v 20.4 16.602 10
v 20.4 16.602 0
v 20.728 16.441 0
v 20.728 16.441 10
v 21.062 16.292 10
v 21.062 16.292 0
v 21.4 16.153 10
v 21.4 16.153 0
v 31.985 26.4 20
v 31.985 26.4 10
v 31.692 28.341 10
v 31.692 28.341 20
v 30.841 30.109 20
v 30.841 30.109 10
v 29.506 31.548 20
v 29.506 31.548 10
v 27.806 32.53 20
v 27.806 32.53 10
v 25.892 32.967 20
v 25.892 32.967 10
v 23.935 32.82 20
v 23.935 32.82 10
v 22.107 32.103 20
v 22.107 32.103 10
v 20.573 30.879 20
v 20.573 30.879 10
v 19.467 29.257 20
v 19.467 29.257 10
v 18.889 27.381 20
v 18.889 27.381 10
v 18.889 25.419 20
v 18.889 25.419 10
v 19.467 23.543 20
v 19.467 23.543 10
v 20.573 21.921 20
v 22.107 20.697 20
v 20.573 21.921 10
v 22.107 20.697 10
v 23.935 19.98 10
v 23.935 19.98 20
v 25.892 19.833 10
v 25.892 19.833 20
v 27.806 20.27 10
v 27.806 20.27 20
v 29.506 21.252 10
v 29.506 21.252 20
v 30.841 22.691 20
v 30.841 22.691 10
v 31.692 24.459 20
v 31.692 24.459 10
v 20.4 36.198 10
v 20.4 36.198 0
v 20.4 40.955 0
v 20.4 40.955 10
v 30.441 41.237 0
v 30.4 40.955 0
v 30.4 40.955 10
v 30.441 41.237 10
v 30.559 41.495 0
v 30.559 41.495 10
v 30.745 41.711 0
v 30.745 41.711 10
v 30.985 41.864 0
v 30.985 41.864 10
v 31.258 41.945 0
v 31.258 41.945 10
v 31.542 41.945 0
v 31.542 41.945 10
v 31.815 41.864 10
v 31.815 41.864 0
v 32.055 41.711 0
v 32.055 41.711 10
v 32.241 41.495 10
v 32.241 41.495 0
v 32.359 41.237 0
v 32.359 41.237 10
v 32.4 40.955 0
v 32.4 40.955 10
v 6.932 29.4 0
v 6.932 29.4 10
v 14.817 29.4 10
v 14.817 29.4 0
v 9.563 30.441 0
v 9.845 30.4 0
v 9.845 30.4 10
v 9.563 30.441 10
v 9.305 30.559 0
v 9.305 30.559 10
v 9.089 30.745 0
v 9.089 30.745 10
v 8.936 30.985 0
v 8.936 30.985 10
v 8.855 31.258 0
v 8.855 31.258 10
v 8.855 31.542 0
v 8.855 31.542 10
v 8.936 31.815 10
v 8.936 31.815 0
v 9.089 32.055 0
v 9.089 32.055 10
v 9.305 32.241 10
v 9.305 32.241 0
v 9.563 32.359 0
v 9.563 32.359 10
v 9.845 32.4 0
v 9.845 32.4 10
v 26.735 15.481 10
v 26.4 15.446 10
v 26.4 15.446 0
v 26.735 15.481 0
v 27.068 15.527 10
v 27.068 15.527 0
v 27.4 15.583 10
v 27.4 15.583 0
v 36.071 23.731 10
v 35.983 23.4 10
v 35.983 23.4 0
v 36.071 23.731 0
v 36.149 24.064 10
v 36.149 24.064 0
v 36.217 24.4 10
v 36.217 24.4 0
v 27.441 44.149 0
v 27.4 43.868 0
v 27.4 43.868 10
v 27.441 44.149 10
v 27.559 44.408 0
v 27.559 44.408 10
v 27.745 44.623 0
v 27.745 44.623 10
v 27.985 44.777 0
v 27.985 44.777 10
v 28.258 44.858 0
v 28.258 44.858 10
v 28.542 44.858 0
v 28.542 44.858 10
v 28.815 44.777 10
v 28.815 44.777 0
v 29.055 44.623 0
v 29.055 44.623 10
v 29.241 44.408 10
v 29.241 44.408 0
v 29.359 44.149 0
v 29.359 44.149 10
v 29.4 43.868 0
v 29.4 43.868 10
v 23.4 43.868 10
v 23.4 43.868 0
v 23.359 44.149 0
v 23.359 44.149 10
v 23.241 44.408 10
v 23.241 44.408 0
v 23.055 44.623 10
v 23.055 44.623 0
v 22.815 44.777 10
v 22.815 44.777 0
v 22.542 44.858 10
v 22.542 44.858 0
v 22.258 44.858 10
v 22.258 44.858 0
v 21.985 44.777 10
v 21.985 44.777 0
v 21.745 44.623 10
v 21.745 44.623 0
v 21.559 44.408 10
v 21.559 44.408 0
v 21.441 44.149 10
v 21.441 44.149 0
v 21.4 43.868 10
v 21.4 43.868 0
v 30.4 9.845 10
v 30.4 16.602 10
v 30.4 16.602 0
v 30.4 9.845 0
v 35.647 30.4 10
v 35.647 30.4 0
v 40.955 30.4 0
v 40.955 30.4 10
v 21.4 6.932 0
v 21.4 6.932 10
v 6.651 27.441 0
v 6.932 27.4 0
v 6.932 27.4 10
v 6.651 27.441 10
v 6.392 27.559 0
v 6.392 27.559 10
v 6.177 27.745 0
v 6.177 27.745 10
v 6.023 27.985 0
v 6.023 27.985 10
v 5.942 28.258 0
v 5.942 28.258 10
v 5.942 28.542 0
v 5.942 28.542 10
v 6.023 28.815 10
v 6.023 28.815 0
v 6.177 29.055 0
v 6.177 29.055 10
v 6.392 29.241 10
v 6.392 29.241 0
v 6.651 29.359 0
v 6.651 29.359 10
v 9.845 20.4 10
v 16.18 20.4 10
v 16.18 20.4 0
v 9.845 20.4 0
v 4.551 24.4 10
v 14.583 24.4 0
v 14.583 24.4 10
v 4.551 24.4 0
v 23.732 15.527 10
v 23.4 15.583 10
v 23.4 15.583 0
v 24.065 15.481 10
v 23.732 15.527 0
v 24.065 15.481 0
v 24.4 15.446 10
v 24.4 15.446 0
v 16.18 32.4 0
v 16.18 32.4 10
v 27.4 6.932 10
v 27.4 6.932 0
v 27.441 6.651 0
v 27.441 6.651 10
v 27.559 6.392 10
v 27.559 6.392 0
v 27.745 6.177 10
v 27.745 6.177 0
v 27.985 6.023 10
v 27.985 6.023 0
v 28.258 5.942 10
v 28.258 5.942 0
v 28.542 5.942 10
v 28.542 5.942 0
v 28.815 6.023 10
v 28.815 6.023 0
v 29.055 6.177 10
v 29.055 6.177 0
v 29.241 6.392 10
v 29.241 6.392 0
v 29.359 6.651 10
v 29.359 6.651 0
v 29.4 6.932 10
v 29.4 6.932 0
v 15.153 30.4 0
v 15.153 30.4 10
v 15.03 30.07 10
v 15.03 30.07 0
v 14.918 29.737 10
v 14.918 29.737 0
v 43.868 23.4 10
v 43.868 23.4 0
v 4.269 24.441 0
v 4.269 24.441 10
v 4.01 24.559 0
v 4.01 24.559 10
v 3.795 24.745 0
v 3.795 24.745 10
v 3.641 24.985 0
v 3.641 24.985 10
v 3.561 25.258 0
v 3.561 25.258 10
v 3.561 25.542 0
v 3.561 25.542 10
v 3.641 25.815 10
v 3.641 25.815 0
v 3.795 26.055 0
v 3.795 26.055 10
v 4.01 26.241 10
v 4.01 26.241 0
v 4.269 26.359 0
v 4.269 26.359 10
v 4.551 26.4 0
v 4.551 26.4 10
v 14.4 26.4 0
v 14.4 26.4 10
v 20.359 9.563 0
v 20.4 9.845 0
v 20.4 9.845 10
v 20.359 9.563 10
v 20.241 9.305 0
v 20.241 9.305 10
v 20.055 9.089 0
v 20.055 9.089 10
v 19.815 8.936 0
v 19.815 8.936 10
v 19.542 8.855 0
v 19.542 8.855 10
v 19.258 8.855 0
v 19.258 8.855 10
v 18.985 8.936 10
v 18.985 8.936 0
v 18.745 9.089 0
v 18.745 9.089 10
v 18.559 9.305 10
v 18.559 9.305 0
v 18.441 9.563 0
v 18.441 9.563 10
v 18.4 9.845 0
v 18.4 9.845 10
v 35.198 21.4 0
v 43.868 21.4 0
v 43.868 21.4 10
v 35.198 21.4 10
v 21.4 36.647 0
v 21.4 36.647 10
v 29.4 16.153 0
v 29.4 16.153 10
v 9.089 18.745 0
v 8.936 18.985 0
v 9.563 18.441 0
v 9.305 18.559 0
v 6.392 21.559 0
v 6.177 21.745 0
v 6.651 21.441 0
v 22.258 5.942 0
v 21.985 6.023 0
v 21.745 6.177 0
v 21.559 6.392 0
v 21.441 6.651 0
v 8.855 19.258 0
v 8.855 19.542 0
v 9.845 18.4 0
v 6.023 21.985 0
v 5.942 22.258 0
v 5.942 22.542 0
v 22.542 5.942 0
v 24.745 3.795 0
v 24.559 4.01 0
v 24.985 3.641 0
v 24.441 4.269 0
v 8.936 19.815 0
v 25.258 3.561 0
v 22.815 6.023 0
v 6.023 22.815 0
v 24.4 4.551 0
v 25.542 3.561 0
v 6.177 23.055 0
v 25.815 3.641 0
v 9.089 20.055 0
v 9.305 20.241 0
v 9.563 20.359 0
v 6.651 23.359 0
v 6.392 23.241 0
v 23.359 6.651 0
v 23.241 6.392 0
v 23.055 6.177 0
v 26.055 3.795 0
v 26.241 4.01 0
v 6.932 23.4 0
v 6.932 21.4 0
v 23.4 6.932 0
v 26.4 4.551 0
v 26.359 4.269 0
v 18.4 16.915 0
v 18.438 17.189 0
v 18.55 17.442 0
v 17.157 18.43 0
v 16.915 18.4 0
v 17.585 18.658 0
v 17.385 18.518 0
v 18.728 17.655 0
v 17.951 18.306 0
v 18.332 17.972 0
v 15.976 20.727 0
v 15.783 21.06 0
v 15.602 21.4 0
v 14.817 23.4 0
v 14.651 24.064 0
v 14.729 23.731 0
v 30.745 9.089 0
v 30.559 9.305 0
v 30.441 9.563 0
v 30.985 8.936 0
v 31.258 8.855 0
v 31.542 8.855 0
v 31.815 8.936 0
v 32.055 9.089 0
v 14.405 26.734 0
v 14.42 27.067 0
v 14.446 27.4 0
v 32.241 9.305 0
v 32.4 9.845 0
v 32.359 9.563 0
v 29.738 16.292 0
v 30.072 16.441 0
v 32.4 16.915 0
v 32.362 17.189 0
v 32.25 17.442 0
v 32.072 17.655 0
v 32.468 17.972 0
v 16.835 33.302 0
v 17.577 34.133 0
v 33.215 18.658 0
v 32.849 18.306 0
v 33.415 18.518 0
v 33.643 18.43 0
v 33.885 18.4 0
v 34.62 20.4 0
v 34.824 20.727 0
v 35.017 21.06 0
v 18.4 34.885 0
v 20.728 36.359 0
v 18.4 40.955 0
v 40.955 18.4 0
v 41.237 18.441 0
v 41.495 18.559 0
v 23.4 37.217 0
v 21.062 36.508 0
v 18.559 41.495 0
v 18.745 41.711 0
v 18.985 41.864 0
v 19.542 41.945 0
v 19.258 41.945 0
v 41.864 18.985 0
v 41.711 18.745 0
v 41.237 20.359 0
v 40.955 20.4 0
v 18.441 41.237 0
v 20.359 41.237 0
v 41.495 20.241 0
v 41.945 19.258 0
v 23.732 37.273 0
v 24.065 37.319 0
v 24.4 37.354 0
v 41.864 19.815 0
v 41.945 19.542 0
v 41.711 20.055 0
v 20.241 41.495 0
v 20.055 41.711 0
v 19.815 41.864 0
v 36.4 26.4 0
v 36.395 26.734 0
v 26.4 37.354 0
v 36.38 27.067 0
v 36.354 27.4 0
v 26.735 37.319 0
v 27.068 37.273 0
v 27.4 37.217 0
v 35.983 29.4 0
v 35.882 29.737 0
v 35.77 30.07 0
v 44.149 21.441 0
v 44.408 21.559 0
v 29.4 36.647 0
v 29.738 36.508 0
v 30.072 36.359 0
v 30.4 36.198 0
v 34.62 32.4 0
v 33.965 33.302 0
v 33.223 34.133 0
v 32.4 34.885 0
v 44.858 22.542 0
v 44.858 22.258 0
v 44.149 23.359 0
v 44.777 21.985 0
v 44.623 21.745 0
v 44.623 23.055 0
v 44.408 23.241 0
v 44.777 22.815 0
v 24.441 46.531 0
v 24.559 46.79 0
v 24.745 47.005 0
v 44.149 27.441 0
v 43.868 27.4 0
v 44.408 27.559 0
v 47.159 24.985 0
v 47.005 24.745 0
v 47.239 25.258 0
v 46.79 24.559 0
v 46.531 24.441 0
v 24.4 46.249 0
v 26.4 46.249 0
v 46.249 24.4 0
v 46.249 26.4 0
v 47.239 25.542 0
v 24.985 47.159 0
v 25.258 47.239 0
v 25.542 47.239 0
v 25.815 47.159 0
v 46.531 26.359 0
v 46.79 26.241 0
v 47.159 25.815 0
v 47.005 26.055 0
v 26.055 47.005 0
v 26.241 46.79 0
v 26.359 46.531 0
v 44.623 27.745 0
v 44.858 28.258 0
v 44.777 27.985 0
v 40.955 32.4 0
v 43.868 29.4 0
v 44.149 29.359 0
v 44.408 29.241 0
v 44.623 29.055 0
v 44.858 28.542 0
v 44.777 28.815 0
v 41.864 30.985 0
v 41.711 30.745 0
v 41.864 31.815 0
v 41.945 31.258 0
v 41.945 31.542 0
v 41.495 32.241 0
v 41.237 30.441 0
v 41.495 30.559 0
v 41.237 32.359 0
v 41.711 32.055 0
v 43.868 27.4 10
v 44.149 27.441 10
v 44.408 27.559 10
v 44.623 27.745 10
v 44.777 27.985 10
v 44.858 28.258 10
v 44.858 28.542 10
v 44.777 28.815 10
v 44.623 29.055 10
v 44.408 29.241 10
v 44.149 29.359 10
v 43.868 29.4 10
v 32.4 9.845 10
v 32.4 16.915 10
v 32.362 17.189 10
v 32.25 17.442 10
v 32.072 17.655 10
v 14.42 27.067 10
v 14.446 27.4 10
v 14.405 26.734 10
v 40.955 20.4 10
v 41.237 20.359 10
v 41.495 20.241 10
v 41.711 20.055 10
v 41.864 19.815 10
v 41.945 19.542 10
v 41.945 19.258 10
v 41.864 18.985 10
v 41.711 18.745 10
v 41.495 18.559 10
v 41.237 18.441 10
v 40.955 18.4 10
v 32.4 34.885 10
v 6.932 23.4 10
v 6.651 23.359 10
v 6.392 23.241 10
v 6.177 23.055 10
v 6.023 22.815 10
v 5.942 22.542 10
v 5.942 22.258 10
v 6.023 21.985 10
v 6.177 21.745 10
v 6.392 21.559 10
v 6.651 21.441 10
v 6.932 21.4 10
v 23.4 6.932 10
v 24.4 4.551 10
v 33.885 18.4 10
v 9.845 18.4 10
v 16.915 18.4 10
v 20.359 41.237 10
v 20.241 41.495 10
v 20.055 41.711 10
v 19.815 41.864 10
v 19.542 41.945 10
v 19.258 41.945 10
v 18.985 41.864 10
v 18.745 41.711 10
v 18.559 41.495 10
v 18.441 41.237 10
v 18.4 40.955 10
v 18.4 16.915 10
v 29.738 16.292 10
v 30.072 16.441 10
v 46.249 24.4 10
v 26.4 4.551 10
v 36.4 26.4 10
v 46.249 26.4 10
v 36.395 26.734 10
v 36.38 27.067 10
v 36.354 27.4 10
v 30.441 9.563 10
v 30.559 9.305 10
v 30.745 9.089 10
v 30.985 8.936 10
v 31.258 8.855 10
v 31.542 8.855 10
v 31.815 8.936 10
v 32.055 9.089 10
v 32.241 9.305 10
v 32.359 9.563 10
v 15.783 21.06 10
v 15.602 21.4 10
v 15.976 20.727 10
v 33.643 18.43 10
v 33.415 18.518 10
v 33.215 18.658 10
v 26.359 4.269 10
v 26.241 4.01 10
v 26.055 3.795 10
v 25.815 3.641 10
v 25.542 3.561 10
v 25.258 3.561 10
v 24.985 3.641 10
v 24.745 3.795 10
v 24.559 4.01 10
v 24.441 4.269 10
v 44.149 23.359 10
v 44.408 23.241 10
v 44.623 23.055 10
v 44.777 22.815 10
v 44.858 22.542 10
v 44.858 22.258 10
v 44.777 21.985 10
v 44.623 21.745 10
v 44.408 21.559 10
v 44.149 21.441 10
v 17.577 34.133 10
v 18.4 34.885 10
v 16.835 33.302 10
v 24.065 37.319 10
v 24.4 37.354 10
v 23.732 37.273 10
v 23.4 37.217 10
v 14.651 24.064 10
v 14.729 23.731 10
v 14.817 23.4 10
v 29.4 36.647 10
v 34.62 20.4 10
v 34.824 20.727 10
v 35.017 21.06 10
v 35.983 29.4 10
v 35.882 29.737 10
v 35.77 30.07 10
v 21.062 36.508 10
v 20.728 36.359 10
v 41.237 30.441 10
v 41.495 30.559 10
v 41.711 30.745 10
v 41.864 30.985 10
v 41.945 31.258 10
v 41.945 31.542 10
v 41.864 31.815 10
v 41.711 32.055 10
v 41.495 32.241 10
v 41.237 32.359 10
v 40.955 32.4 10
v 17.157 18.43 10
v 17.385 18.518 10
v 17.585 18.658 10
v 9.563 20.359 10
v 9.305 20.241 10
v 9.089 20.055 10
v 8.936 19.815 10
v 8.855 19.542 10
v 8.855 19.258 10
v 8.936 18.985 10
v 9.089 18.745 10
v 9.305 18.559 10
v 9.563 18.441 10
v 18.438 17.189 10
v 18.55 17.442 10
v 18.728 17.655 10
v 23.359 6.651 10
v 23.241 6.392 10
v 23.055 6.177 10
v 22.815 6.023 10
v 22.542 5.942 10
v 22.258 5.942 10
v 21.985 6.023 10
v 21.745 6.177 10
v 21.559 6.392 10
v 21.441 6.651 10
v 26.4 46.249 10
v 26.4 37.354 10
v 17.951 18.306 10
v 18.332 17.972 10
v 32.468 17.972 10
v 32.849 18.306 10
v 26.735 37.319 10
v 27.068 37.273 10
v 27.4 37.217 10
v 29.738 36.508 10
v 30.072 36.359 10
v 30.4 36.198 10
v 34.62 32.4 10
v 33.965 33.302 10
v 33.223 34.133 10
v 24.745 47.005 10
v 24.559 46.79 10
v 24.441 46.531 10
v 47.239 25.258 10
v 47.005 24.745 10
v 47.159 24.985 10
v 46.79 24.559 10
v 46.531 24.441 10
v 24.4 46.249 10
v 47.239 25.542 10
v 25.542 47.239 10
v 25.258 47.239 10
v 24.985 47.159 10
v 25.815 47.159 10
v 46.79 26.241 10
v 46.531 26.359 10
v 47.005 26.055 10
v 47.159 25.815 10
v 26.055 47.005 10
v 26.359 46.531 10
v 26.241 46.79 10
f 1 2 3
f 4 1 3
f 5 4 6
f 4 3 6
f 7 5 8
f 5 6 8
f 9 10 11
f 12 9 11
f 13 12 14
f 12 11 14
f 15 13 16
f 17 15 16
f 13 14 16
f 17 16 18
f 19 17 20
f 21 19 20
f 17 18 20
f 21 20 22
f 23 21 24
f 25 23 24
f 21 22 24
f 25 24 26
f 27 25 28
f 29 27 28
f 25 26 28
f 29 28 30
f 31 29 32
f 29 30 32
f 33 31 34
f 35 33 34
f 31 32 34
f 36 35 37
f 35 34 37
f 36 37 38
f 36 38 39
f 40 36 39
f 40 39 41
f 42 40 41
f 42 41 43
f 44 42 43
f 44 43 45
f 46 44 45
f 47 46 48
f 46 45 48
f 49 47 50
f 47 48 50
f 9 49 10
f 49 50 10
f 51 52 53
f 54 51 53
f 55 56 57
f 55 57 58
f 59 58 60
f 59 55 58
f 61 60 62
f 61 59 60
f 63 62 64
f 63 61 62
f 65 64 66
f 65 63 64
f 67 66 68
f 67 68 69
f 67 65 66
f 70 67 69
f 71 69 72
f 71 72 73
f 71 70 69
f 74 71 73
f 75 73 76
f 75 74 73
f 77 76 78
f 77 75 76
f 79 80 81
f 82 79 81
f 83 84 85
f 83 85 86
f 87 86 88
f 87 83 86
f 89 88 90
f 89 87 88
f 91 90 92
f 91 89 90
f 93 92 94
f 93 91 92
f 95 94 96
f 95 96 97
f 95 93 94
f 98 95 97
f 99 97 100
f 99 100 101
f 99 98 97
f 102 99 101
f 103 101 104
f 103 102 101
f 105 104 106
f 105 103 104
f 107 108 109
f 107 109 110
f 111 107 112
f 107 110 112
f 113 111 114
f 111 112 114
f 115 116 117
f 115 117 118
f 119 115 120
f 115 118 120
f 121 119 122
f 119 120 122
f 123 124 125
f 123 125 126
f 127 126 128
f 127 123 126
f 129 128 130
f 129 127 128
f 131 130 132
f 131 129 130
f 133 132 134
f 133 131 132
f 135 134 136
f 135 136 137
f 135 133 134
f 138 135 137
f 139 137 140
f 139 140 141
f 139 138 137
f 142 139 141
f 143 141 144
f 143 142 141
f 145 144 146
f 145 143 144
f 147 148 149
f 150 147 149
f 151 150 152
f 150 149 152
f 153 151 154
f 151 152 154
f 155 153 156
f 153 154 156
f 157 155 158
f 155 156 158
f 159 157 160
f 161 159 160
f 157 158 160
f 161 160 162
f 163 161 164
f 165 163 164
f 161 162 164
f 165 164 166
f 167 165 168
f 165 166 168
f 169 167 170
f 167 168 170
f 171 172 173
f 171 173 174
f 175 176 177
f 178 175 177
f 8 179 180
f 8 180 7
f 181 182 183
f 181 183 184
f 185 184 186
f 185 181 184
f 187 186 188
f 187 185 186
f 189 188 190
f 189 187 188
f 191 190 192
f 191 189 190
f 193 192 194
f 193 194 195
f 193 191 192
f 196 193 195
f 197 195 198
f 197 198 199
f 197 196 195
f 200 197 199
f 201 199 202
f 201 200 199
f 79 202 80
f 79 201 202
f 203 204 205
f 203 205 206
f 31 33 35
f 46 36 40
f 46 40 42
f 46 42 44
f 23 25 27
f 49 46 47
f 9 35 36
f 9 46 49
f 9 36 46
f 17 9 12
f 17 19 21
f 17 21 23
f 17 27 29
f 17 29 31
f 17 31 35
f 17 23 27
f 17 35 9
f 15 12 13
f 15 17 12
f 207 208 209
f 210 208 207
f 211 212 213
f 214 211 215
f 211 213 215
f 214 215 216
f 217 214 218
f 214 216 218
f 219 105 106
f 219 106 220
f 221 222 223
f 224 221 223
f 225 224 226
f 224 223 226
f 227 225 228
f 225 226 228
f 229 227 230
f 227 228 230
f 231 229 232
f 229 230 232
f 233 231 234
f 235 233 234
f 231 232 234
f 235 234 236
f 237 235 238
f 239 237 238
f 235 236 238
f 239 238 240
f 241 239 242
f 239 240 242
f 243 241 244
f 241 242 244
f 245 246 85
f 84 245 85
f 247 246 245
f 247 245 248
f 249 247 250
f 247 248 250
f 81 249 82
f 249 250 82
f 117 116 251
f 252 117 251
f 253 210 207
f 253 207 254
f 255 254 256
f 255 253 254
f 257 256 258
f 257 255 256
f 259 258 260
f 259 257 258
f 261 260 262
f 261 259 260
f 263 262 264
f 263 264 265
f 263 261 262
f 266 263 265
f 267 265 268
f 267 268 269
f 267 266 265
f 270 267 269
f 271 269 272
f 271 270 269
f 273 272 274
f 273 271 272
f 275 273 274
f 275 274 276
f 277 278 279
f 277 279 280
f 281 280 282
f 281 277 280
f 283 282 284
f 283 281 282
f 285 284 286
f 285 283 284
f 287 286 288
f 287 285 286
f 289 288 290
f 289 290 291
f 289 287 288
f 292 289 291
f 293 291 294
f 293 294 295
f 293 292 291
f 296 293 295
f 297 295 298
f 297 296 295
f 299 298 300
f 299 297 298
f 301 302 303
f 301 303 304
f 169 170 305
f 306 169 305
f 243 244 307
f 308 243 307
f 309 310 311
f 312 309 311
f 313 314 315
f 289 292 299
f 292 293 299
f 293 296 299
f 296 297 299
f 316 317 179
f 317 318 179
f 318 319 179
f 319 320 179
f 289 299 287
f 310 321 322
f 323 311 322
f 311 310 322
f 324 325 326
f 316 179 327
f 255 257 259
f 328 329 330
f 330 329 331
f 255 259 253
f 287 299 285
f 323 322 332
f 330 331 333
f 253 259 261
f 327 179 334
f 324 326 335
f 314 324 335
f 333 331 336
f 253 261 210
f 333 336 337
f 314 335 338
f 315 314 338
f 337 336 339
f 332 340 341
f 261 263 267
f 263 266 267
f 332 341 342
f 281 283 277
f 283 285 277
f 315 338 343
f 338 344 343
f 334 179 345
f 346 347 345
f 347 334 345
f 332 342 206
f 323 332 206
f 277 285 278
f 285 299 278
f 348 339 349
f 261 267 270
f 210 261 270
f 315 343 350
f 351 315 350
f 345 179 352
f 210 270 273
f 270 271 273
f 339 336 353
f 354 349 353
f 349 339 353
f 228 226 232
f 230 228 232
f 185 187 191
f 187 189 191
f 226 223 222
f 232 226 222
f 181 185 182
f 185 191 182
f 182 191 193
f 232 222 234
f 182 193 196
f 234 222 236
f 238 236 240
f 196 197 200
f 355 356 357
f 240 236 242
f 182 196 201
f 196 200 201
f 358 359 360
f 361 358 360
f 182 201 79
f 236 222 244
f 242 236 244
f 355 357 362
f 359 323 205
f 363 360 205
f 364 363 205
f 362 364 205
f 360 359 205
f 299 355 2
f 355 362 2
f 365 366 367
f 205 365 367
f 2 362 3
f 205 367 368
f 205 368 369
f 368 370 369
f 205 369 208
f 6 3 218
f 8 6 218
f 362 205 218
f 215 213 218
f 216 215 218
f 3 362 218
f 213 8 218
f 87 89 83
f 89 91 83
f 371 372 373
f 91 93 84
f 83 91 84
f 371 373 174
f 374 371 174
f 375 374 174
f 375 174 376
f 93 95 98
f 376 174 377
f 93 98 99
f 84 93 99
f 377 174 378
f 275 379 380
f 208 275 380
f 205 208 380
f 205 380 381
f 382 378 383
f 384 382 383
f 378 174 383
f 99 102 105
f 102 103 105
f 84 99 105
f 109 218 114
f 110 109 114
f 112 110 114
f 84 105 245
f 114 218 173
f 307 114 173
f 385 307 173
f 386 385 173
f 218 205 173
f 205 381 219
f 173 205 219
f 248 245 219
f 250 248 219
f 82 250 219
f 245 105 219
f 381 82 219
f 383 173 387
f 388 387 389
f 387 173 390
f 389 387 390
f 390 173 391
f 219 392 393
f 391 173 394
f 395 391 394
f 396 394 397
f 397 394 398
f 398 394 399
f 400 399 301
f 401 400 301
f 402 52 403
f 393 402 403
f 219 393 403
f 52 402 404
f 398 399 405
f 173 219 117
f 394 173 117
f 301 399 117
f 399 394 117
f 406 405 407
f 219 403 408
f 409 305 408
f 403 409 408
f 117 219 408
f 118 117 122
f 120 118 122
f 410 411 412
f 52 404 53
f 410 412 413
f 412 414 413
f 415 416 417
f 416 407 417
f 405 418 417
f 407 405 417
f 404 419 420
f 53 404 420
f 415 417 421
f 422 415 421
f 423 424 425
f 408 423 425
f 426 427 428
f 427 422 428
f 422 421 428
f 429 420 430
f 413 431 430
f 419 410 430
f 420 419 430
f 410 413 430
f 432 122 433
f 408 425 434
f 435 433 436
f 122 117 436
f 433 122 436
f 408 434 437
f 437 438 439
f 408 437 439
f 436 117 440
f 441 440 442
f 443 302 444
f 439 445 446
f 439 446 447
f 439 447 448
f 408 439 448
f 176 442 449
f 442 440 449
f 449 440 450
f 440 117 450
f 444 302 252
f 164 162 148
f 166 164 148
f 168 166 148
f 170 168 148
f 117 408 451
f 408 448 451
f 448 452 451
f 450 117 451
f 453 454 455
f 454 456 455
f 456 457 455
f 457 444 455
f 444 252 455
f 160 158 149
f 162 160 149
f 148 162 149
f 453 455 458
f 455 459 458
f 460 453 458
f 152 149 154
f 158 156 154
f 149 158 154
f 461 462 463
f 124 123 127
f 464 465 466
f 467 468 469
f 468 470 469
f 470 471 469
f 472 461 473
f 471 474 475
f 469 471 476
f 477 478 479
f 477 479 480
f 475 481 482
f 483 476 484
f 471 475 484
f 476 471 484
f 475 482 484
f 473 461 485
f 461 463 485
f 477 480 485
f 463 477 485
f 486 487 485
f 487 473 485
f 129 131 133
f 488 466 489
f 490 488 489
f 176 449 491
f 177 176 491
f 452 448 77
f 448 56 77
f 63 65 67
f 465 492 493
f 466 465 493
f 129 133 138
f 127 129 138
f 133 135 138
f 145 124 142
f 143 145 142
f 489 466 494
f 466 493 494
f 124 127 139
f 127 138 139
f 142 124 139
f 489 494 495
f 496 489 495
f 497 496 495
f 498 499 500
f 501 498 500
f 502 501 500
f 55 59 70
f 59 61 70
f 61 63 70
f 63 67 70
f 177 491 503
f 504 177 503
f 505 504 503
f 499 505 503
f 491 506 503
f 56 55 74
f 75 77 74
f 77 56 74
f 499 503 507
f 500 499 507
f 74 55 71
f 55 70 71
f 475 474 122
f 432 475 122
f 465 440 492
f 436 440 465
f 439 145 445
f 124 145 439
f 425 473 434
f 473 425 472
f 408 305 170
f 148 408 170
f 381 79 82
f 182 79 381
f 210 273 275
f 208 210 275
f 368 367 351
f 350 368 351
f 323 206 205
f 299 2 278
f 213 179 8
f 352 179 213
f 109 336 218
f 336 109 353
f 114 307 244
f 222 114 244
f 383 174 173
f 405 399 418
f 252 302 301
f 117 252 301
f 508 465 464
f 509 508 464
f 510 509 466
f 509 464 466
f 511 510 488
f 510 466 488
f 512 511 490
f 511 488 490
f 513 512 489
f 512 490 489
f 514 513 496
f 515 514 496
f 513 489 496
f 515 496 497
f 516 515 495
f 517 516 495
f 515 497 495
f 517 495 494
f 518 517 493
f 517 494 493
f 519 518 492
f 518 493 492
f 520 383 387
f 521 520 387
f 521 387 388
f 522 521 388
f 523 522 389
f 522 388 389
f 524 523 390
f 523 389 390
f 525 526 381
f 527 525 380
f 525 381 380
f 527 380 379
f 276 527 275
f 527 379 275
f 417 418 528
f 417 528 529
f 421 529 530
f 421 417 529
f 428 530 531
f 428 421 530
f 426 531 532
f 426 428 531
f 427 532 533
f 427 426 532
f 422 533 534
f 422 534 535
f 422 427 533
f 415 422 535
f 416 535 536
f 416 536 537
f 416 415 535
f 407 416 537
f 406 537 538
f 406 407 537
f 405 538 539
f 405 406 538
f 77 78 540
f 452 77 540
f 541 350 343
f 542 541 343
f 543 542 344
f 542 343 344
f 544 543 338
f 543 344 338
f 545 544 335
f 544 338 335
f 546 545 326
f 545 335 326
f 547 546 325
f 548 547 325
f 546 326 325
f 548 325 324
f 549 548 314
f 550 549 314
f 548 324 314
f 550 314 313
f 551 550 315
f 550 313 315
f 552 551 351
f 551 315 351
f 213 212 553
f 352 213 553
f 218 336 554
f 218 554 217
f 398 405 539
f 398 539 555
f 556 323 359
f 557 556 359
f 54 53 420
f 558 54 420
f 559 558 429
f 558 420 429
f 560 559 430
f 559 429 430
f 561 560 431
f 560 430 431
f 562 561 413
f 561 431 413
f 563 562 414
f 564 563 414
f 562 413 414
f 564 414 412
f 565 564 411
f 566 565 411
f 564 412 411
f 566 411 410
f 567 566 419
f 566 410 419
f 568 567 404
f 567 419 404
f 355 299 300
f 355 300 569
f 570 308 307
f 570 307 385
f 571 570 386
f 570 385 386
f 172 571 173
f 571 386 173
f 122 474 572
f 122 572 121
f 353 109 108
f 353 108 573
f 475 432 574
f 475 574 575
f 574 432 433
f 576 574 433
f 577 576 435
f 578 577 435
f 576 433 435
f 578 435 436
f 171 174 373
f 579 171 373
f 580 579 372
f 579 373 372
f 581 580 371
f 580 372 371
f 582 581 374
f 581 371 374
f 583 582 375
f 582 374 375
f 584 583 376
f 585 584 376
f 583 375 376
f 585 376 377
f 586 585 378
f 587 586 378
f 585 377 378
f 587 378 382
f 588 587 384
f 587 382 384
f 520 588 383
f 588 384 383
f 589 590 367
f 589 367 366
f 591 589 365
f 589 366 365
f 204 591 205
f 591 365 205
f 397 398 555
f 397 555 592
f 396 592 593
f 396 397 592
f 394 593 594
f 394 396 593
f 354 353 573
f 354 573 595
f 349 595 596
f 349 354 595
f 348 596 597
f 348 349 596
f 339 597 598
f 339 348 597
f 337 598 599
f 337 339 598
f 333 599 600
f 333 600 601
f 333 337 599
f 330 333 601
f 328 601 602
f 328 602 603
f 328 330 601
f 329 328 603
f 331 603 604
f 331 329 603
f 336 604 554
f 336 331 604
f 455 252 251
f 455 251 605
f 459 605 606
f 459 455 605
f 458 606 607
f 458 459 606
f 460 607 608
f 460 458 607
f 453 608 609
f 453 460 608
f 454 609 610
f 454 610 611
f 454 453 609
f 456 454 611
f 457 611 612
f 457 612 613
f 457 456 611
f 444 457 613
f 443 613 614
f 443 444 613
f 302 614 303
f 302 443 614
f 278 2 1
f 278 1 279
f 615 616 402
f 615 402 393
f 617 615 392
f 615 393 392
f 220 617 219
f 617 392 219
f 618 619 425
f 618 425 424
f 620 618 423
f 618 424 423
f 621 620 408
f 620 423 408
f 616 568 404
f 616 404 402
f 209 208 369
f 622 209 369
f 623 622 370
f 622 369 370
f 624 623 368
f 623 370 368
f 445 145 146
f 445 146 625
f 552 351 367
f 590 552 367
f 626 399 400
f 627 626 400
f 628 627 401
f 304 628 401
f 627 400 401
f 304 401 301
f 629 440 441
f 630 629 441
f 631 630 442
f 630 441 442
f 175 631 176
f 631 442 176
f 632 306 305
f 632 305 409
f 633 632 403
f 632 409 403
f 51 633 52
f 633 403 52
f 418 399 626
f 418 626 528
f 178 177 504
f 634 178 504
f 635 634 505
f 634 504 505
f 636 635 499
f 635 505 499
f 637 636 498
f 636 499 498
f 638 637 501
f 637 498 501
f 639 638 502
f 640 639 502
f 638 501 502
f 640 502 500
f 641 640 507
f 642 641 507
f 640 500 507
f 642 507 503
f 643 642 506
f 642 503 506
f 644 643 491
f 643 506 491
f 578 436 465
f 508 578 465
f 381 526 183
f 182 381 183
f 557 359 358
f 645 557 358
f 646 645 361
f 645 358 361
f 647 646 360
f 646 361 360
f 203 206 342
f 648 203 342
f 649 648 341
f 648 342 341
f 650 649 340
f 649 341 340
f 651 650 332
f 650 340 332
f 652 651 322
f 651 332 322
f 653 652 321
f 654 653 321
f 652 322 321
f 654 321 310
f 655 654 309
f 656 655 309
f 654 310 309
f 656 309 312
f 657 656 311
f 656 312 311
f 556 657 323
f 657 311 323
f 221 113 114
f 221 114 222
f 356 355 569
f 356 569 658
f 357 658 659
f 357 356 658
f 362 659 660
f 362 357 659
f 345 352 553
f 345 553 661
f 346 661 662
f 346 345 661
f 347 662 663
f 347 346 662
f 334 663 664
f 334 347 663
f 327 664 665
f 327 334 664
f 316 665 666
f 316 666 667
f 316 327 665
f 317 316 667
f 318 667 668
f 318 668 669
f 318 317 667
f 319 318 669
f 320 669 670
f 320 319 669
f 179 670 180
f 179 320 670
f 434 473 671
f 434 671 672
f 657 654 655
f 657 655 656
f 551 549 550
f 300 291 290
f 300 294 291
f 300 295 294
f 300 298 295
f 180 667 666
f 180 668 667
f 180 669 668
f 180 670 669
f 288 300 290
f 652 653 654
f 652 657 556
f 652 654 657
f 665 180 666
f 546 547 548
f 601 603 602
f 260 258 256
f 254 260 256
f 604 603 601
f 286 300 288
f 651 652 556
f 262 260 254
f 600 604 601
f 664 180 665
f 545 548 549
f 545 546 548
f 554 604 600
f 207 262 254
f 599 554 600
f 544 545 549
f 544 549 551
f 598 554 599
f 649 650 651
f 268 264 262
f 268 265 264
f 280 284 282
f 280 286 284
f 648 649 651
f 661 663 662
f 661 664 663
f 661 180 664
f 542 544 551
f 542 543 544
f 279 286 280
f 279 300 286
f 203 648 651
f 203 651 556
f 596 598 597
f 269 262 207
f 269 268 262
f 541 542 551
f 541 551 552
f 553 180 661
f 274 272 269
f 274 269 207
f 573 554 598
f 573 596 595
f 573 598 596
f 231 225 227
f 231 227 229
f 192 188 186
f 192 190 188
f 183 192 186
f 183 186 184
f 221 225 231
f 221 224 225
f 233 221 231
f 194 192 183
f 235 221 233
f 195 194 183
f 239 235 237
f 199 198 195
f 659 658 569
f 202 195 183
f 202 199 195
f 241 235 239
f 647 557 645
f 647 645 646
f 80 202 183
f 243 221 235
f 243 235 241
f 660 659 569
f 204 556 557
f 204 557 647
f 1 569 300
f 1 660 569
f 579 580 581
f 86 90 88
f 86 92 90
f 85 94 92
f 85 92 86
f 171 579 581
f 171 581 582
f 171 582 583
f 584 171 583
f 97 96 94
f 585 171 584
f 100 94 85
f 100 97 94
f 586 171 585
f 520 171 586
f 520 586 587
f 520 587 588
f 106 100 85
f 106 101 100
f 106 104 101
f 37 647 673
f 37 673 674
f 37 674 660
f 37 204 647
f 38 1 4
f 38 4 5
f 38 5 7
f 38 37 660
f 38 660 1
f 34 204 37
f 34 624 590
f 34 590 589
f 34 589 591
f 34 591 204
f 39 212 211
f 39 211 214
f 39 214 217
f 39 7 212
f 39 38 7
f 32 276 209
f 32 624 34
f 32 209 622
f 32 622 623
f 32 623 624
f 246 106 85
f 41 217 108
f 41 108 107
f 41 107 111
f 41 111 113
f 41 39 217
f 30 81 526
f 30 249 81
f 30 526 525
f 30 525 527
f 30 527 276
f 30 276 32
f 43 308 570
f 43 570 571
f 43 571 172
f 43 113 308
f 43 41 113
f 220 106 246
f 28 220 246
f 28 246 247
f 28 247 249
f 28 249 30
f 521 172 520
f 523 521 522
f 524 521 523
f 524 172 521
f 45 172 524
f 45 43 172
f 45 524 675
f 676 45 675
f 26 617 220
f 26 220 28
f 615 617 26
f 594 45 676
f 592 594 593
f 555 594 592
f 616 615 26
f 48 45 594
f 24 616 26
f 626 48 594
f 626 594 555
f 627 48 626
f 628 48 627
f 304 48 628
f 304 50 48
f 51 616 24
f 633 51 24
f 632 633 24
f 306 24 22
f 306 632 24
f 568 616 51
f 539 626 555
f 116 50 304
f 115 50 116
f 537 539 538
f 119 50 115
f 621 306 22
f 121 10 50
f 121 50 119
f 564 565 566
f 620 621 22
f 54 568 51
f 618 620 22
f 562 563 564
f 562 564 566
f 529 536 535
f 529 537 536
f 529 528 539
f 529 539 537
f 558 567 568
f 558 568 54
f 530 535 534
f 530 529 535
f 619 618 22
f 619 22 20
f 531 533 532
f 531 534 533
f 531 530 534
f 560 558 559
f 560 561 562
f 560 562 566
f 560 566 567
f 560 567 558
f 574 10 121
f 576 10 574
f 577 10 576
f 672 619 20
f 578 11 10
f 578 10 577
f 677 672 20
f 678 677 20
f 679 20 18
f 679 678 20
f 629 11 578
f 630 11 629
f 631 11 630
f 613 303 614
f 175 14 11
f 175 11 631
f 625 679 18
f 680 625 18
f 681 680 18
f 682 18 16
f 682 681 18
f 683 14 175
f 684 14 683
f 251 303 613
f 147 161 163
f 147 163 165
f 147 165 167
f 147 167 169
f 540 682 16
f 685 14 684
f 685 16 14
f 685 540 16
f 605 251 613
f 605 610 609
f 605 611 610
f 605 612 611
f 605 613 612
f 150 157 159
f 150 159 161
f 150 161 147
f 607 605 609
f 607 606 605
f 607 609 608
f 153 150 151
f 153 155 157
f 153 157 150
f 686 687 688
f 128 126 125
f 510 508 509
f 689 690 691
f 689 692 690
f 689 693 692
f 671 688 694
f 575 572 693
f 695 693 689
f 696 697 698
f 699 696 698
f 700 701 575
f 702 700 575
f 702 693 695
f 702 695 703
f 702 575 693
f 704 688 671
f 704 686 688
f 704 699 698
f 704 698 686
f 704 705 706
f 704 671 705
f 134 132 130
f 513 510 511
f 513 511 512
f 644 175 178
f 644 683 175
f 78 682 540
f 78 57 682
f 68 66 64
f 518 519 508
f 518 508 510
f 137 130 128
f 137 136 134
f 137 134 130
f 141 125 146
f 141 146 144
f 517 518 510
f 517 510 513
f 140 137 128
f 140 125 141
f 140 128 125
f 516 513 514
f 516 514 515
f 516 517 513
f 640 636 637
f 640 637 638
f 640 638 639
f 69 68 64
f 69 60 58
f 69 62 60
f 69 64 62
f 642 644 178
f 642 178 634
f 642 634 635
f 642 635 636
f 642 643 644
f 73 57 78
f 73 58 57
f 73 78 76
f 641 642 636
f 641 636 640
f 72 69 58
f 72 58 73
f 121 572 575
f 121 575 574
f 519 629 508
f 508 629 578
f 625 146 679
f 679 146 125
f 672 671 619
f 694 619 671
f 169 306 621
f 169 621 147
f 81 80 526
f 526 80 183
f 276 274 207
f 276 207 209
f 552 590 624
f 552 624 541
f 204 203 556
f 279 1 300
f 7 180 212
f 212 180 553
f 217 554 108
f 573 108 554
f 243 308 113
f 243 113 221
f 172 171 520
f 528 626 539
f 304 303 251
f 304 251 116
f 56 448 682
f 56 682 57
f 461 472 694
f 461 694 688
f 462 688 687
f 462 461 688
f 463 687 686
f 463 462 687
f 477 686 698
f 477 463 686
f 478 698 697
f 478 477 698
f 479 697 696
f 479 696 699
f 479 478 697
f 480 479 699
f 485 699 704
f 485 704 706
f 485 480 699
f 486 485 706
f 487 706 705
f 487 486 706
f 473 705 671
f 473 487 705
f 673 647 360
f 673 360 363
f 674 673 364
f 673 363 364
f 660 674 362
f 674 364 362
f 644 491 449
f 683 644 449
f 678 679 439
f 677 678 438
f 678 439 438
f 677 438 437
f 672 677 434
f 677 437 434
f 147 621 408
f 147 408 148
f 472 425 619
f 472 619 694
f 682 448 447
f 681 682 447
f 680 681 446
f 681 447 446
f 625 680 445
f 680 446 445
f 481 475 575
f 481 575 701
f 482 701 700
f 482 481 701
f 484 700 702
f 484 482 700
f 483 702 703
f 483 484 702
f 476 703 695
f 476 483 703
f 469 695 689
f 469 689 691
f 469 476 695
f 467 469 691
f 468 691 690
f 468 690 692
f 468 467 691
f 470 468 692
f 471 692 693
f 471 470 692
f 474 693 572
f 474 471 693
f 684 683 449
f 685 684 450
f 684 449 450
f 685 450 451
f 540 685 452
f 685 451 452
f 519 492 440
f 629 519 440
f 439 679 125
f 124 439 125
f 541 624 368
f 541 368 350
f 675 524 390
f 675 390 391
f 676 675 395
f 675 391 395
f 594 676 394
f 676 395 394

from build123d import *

# Parameters (mm, degrees)
BOSS_EXTRUDE3_DEPTH    = 10
BOSS_EXTRUDE3_2_DEPTH  = 10
BOSS_EXTRUDE3_3_DEPTH  = 10
BOSS_EXTRUDE3_4_DEPTH  = 10
BOSS_EXTRUDE3_5_DEPTH  = 10
BOSS_EXTRUDE3_6_DEPTH  = 10
BOSS_EXTRUDE3_7_DEPTH  = 10
BOSS_EXTRUDE3_8_DEPTH  = 10
BOSS_EXTRUDE3_9_DEPTH  = 10
BOSS_EXTRUDE3_10_DEPTH = 10
BOSS_EXTRUDE3_11_DEPTH = 10
BOSS_EXTRUDE3_12_DEPTH = 10
BOSS_EXTRUDE3_13_DEPTH = 10
BOSS_EXTRUDE3_14_DEPTH = 10
BOSS_EXTRUDE3_15_DEPTH = 10
BOSS_EXTRUDE3_16_DEPTH = 10
BOSS_EXTRUDE3_17_DEPTH = 10
BOSS_EXTRUDE3_18_DEPTH = 10
BOSS_EXTRUDE3_19_DEPTH = 10
BOSS_EXTRUDE3_20_DEPTH = 10
SKETCH12_R             = 11
BOSS_EXTRUDE4_DEPTH    = 10
SKETCH13_R             = 6.585
BOSS_EXTRUDE5_DEPTH    = 10


with BuildPart() as part:
    # Sketch11 → Boss-Extrude3 (new body)
    with BuildSketch(Plane.XY):
        with BuildLine():
            Line((24.4, 31.507143862), (24.4, 46.249205315))
            ThreePointArc((24.4, 46.249205315), (25.4, 47.249205315), (26.4, 46.249205315))
            Line((26.4, 46.249205315), (26.4, 31.507143862))
            ThreePointArc((26.4, 31.507143862), (25.4, 30.507143862), (24.4, 31.507143862))
        make_face()
    extrude(amount=BOSS_EXTRUDE3_DEPTH)



with BuildPart() as body_2:
    # Sketch11 → Boss-Extrude3 2 (new body)
    with BuildSketch(Plane.XY):
        with BuildLine():
            Line((27.4, 30.400840206), (27.4, 43.867696771))
            ThreePointArc((27.4, 43.867696771), (28.4, 44.867696771), (29.4, 43.867696771))
            Line((29.4, 43.867696771), (29.4, 30.400840206))
            ThreePointArc((29.4, 30.400840206), (28.4, 29.400840206), (27.4, 30.400840206))
        make_face()
    extrude(amount=BOSS_EXTRUDE3_2_DEPTH)


with BuildPart() as body_3:
    # Sketch11 → Boss-Extrude3 3 (new body)
    with BuildSketch(Plane.XY):
        with BuildLine():
            Line((30.4, 33.885281374), (30.4, 40.954829552))
            ThreePointArc((30.4, 40.954829552), (31.4, 41.954829552), (32.4, 40.954829552))
            Line((32.4, 40.954829552), (32.4, 33.885281374))
            ThreePointArc((32.4, 33.885281374), (31.4, 32.885281374), (30.4, 33.885281374))
        make_face()
    extrude(amount=BOSS_EXTRUDE3_3_DEPTH)


with BuildPart() as body_4:
    # Sketch11 → Boss-Extrude3 4 (new body)
    with BuildSketch(Plane.XY):
        with BuildLine():
            Line((23.4, 30.400840206), (23.4, 43.867696771))
            ThreePointArc((23.4, 43.867696771), (22.4, 44.867696771), (21.4, 43.867696771))
            Line((21.4, 43.867696771), (21.4, 30.400840206))
            ThreePointArc((21.4, 30.400840206), (22.4, 29.400840206), (23.4, 30.400840206))
        make_face()
    extrude(amount=BOSS_EXTRUDE3_4_DEPTH)


with BuildPart() as body_5:
    # Sketch11 → Boss-Extrude3 5 (new body)
    with BuildSketch(Plane.XY):
        with BuildLine():
            Line((20.4, 33.885281374), (20.4, 40.954829552))
            ThreePointArc((20.4, 40.954829552), (19.4, 41.954829552), (18.4, 40.954829552))
            Line((18.4, 40.954829552), (18.4, 33.885281374))
            ThreePointArc((18.4, 33.885281374), (19.4, 32.885281374), (20.4, 33.885281374))
        make_face()
    extrude(amount=BOSS_EXTRUDE3_5_DEPTH)


with BuildPart() as body_6:
    # Sketch11 → Boss-Extrude3 6 (new body)
    with BuildSketch(Plane.XY):
        with BuildLine():
            Line((31.507143862, 26.4), (46.249205315, 26.4))
            ThreePointArc((46.249205315, 26.4), (47.249205315, 25.4), (46.249205315, 24.4))
            Line((46.249205315, 24.4), (31.507143862, 24.4))
            ThreePointArc((31.507143862, 24.4), (30.507143862, 25.4), (31.507143862, 26.4))
        make_face()
    extrude(amount=BOSS_EXTRUDE3_6_DEPTH)


with BuildPart() as body_7:
    # Sketch11 → Boss-Extrude3 7 (new body)
    with BuildSketch(Plane.XY):
        with BuildLine():
            Line((30.400840206, 23.4), (43.867696771, 23.4))
            ThreePointArc((43.867696771, 23.4), (44.867696771, 22.4), (43.867696771, 21.4))
            Line((43.867696771, 21.4), (30.400840206, 21.4))
            ThreePointArc((30.400840206, 21.4), (29.400840206, 22.4), (30.400840206, 23.4))
        make_face()
    extrude(amount=BOSS_EXTRUDE3_7_DEPTH)


with BuildPart() as body_8:
    # Sketch11 → Boss-Extrude3 8 (new body)
    with BuildSketch(Plane.XY):
        with BuildLine():
            Line((33.885281374, 20.4), (40.954829552, 20.4))
            ThreePointArc((40.954829552, 20.4), (41.954829552, 19.4), (40.954829552, 18.4))
            Line((40.954829552, 18.4), (33.885281374, 18.4))
            ThreePointArc((33.885281374, 18.4), (32.885281374, 19.4), (33.885281374, 20.4))
        make_face()
    extrude(amount=BOSS_EXTRUDE3_8_DEPTH)


with BuildPart() as body_9:
    # Sketch11 → Boss-Extrude3 9 (new body)
    with BuildSketch(Plane.XY):
        with BuildLine():
            Line((30.400840206, 27.4), (43.867696771, 27.4))
            ThreePointArc((43.867696771, 27.4), (44.867696771, 28.4), (43.867696771, 29.4))
            Line((43.867696771, 29.4), (30.400840206, 29.4))
            ThreePointArc((30.400840206, 29.4), (29.400840206, 28.4), (30.400840206, 27.4))
        make_face()
    extrude(amount=BOSS_EXTRUDE3_9_DEPTH)


with BuildPart() as body_10:
    # Sketch11 → Boss-Extrude3 10 (new body)
    with BuildSketch(Plane.XY):
        with BuildLine():
            Line((33.885281374, 30.4), (40.954829552, 30.4))
            ThreePointArc((40.954829552, 30.4), (41.954829552, 31.4), (40.954829552, 32.4))
            Line((40.954829552, 32.4), (33.885281374, 32.4))
            ThreePointArc((33.885281374, 32.4), (32.885281374, 31.4), (33.885281374, 30.4))
        make_face()
    extrude(amount=BOSS_EXTRUDE3_10_DEPTH)


with BuildPart() as body_11:
    # Sketch11 → Boss-Extrude3 11 (new body)
    with BuildSketch(Plane.XY):
        with BuildLine():
            Line((26.4, 19.292856138), (26.4, 4.550794685))
            ThreePointArc((26.4, 4.550794685), (25.4, 3.550794685), (24.4, 4.550794685))
            Line((24.4, 4.550794685), (24.4, 19.292856138))
            ThreePointArc((24.4, 19.292856138), (25.4, 20.292856138), (26.4, 19.292856138))
        make_face()
    extrude(amount=BOSS_EXTRUDE3_11_DEPTH)


with BuildPart() as body_12:
    # Sketch11 → Boss-Extrude3 12 (new body)
    with BuildSketch(Plane.XY):
        with BuildLine():
            Line((23.4, 20.399159794), (23.4, 6.932303229))
            ThreePointArc((23.4, 6.932303229), (22.4, 5.932303229), (21.4, 6.932303229))
            Line((21.4, 6.932303229), (21.4, 20.399159794))
            ThreePointArc((21.4, 20.399159794), (22.4, 21.399159794), (23.4, 20.399159794))
        make_face()
    extrude(amount=BOSS_EXTRUDE3_12_DEPTH)


with BuildPart() as body_13:
    # Sketch11 → Boss-Extrude3 13 (new body)
    with BuildSketch(Plane.XY):
        with BuildLine():
            Line((20.4, 16.914718626), (20.4, 9.845170448))
            ThreePointArc((20.4, 9.845170448), (19.4, 8.845170448), (18.4, 9.845170448))
            Line((18.4, 9.845170448), (18.4, 16.914718626))
            ThreePointArc((18.4, 16.914718626), (19.4, 17.914718626), (20.4, 16.914718626))
        make_face()
    extrude(amount=BOSS_EXTRUDE3_13_DEPTH)


with BuildPart() as body_14:
    # Sketch11 → Boss-Extrude3 14 (new body)
    with BuildSketch(Plane.XY):
        with BuildLine():
            Line((27.4, 20.399159794), (27.4, 6.932303229))
            ThreePointArc((27.4, 6.932303229), (28.4, 5.932303229), (29.4, 6.932303229))
            Line((29.4, 6.932303229), (29.4, 20.399159794))
            ThreePointArc((29.4, 20.399159794), (28.4, 21.399159794), (27.4, 20.399159794))
        make_face()
    extrude(amount=BOSS_EXTRUDE3_14_DEPTH)


with BuildPart() as body_15:
    # Sketch11 → Boss-Extrude3 15 (new body)
    with BuildSketch(Plane.XY):
        with BuildLine():
            Line((30.4, 16.914718626), (30.4, 9.845170448))
            ThreePointArc((30.4, 9.845170448), (31.4, 8.845170448), (32.4, 9.845170448))
            Line((32.4, 9.845170448), (32.4, 16.914718626))
            ThreePointArc((32.4, 16.914718626), (31.4, 17.914718626), (30.4, 16.914718626))
        make_face()
    extrude(amount=BOSS_EXTRUDE3_15_DEPTH)


with BuildPart() as body_16:
    # Sketch11 → Boss-Extrude3 16 (new body)
    with BuildSketch(Plane.XY):
        with BuildLine():
            Line((19.292856138, 24.4), (4.550794685, 24.4))
            ThreePointArc((4.550794685, 24.4), (3.550794685, 25.4), (4.550794685, 26.4))
            Line((4.550794685, 26.4), (19.292856138, 26.4))
            ThreePointArc((19.292856138, 26.4), (20.292856138, 25.4), (19.292856138, 24.4))
        make_face()
    extrude(amount=BOSS_EXTRUDE3_16_DEPTH)


with BuildPart() as body_17:
    # Sketch11 → Boss-Extrude3 17 (new body)
    with BuildSketch(Plane.XY):
        with BuildLine():
            Line((20.399159794, 27.4), (6.932303229, 27.4))
            ThreePointArc((6.932303229, 27.4), (5.932303229, 28.4), (6.932303229, 29.4))
            Line((6.932303229, 29.4), (20.399159794, 29.4))
            ThreePointArc((20.399159794, 29.4), (21.399159794, 28.4), (20.399159794, 27.4))
        make_face()
    extrude(amount=BOSS_EXTRUDE3_17_DEPTH)


with BuildPart() as body_18:
    # Sketch11 → Boss-Extrude3 18 (new body)
    with BuildSketch(Plane.XY):
        with BuildLine():
            Line((16.914718626, 30.4), (9.845170448, 30.4))
            ThreePointArc((9.845170448, 30.4), (8.845170448, 31.4), (9.845170448, 32.4))
            Line((9.845170448, 32.4), (16.914718626, 32.4))
            ThreePointArc((16.914718626, 32.4), (17.914718626, 31.4), (16.914718626, 30.4))
        make_face()
    extrude(amount=BOSS_EXTRUDE3_18_DEPTH)


with BuildPart() as body_19:
    # Sketch11 → Boss-Extrude3 19 (new body)
    with BuildSketch(Plane.XY):
        with BuildLine():
            Line((20.399159794, 23.4), (6.932303229, 23.4))
            ThreePointArc((6.932303229, 23.4), (5.932303229, 22.4), (6.932303229, 21.4))
            Line((6.932303229, 21.4), (20.399159794, 21.4))
            ThreePointArc((20.399159794, 21.4), (21.399159794, 22.4), (20.399159794, 23.4))
        make_face()
    extrude(amount=BOSS_EXTRUDE3_19_DEPTH)


with BuildPart() as body_20:
    # Sketch11 → Boss-Extrude3 20 (new body)
    with BuildSketch(Plane.XY):
        with BuildLine():
            Line((16.914718626, 20.4), (9.845170448, 20.4))
            ThreePointArc((9.845170448, 20.4), (8.845170448, 19.4), (9.845170448, 18.4))
            Line((9.845170448, 18.4), (16.914718626, 18.4))
            ThreePointArc((16.914718626, 18.4), (17.914718626, 19.4), (16.914718626, 20.4))
        make_face()
    extrude(amount=BOSS_EXTRUDE3_20_DEPTH)


with BuildPart() as part_1:
    add(part.part)

    add(body_2.part)  # Boss-Extrude4 merges body 2

    add(body_3.part)  # Boss-Extrude4 merges body 3

    add(body_4.part)  # Boss-Extrude4 merges body 4

    add(body_5.part)  # Boss-Extrude4 merges body 5

    add(body_6.part)  # Boss-Extrude4 merges body 6

    add(body_7.part)  # Boss-Extrude4 merges body 7

    add(body_8.part)  # Boss-Extrude4 merges body 8

    add(body_9.part)  # Boss-Extrude4 merges body 9

    add(body_10.part)  # Boss-Extrude4 merges body 10

    add(body_11.part)  # Boss-Extrude4 merges body 11

    add(body_12.part)  # Boss-Extrude4 merges body 12

    add(body_13.part)  # Boss-Extrude4 merges body 13

    add(body_14.part)  # Boss-Extrude4 merges body 14

    add(body_15.part)  # Boss-Extrude4 merges body 15

    add(body_16.part)  # Boss-Extrude4 merges body 16

    add(body_17.part)  # Boss-Extrude4 merges body 17

    add(body_18.part)  # Boss-Extrude4 merges body 18

    add(body_19.part)  # Boss-Extrude4 merges body 19

    add(body_20.part)  # Boss-Extrude4 merges body 20
    # Sketch12 → Boss-Extrude4 (add)
    with BuildSketch(Plane.XY):
        with Locations((25.4, 26.4)):
            Circle(SKETCH12_R)
    extrude(amount=BOSS_EXTRUDE4_DEPTH)

    # Sketch13 → Boss-Extrude5 (add)
    with BuildSketch(Plane.XY.offset(10)):
        with Locations((25.4, 26.4)):
            Circle(SKETCH13_R)
    extrude(amount=BOSS_EXTRUDE5_DEPTH)


solid = part_1.part
